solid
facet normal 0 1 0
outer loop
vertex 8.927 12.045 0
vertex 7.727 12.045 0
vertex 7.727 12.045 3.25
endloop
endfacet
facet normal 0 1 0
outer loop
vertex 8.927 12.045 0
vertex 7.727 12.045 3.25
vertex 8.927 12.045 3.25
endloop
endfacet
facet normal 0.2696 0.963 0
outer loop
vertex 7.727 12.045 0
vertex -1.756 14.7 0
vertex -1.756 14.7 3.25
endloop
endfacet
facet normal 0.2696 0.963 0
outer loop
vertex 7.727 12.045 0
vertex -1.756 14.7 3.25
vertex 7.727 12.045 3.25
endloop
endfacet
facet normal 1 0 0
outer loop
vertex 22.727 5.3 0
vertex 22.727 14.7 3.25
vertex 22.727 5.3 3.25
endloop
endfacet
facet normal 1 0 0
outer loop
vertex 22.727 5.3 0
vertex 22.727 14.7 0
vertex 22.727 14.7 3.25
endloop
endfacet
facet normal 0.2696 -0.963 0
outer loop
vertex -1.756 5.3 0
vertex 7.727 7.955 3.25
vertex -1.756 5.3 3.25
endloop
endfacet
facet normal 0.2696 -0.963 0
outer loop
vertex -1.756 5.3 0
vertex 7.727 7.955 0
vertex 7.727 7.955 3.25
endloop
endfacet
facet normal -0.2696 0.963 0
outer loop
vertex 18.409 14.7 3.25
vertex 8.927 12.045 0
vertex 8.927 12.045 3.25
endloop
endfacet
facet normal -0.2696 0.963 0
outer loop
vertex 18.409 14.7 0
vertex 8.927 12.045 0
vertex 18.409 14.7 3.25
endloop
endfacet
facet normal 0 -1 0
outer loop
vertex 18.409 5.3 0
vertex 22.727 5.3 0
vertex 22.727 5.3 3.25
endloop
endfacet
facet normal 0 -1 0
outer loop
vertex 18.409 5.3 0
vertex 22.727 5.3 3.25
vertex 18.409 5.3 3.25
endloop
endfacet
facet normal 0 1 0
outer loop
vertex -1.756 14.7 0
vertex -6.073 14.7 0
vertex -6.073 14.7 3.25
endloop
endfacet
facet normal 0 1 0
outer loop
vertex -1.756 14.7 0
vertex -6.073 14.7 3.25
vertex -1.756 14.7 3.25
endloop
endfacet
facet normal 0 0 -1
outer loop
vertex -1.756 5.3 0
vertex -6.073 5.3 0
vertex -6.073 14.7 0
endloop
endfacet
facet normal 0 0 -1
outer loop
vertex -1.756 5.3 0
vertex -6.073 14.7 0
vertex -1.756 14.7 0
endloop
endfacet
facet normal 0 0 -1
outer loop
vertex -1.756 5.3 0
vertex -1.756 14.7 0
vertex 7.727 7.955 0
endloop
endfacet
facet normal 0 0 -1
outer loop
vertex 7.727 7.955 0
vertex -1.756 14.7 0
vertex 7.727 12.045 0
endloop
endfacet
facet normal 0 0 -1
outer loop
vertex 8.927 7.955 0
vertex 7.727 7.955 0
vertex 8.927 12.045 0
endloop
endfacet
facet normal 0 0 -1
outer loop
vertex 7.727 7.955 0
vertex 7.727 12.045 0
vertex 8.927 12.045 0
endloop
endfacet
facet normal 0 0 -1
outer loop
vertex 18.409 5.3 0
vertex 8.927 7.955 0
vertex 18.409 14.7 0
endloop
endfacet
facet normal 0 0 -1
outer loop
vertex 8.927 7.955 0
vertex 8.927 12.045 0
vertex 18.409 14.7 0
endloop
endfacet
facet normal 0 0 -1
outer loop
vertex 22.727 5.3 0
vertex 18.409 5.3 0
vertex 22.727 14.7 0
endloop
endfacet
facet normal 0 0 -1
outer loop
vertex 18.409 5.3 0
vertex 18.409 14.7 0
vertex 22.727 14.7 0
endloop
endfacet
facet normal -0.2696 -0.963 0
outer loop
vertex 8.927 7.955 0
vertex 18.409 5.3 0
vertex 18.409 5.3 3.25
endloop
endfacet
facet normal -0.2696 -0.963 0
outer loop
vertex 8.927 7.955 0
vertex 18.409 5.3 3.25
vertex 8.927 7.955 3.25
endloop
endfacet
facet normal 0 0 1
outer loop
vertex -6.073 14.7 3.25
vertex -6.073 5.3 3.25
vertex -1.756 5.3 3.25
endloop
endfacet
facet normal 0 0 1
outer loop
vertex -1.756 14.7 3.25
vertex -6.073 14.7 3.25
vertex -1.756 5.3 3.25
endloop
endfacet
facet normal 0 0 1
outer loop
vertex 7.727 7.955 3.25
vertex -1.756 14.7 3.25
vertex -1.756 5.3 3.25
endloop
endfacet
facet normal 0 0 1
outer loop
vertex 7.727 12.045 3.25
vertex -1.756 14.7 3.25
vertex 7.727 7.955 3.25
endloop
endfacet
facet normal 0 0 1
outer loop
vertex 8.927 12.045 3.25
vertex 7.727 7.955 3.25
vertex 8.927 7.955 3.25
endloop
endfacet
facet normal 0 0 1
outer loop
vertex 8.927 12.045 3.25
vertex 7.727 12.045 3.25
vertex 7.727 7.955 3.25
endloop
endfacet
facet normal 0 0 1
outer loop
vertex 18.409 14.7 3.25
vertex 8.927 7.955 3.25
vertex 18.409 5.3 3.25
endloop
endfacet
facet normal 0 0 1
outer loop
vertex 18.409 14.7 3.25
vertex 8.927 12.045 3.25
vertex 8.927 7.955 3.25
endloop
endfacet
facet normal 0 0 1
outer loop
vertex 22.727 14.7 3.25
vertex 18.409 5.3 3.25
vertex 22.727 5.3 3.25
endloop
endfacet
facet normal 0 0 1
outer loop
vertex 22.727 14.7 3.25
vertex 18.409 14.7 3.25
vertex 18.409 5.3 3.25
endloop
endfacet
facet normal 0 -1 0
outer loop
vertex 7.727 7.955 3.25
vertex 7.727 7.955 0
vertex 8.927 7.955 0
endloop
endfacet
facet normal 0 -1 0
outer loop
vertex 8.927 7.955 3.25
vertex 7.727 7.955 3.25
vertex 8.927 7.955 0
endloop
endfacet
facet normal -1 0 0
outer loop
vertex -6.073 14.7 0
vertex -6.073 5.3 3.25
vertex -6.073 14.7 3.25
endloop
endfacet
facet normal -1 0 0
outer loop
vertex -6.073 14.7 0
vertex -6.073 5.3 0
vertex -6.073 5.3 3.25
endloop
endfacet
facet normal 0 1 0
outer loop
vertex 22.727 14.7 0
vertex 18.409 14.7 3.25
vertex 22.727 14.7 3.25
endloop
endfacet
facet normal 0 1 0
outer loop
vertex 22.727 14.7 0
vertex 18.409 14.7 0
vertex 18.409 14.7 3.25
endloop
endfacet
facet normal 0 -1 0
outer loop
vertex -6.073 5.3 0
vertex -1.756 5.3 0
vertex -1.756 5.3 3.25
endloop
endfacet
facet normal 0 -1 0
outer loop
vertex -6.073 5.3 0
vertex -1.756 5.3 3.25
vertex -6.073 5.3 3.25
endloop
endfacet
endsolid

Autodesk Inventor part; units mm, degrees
ref_plane "YZ Plane" through (0, 0, 0) normal (1, 0, 0) x (0, 1, 0)
ref_plane "XZ Plane" through (0, 0, 0) normal (0, 1, 0) x (-1, 0, 0)
ref_plane "Work Plane1" through (0, 0, 0) normal (0, 0, 1) x (1, 0, 0)
sketch "Sketch1" plane through (0, 0, 0) normal (0, 0, 1) x (1, 0, 0)
  line L0 (-1.6732, 4.7) -> (-6.6732, 4.7) projected
  line L1 (8.3268, 7.5) -> (-1.6732, 4.7) projected
  line L2 (8.3268, 12.5) -> (8.3268, 7.5) projected
  line L3 (-1.6732, 15.3) -> (8.3268, 12.5) projected
  line L4 (-6.6732, 15.3) -> (-1.6732, 15.3) projected
  line L5 (-6.6732, 4.7) -> (-6.6732, 15.3) projected
  line L6 (-1.7556, 5.3) -> (-6.0732, 5.3)
  line L7 (-6.0732, 5.3) -> (-6.0732, 14.7)
  line L8 (-6.0732, 14.7) -> (-1.7556, 14.7)
  line L9 (-1.7556, 14.7) -> (7.7268, 12.0449)
  line L10 (7.7268, 12.0449) -> (7.7268, 7.9551)
  line L11 (7.7268, 7.9551) -> (-1.7556, 5.3)
  line L12 (7.7268, 12.0449) -> (8.3268, 12.0449)
  line L13 (7.7268, 7.9551) -> (8.3268, 7.9551)
  point P0 (0, 0)
  dimension "d0" = 0.6
ref_plane "Work Plane2" through (-1.6732, 2.5, 3.75) normal (0, 0, 1) x (1, 0, 0)
extrude "Extrusion1" add sketch "Sketch1" along normal blind 3.25 contours L13 L10 L12 L2 | L11 L6 L7 L8 L9 L10
mirror "Mirror2" about plane through (8.3268, 7.9551, 0) normal (1, 0, 0) of "Extrusion1"
properties part number "Bow Tie Key"
